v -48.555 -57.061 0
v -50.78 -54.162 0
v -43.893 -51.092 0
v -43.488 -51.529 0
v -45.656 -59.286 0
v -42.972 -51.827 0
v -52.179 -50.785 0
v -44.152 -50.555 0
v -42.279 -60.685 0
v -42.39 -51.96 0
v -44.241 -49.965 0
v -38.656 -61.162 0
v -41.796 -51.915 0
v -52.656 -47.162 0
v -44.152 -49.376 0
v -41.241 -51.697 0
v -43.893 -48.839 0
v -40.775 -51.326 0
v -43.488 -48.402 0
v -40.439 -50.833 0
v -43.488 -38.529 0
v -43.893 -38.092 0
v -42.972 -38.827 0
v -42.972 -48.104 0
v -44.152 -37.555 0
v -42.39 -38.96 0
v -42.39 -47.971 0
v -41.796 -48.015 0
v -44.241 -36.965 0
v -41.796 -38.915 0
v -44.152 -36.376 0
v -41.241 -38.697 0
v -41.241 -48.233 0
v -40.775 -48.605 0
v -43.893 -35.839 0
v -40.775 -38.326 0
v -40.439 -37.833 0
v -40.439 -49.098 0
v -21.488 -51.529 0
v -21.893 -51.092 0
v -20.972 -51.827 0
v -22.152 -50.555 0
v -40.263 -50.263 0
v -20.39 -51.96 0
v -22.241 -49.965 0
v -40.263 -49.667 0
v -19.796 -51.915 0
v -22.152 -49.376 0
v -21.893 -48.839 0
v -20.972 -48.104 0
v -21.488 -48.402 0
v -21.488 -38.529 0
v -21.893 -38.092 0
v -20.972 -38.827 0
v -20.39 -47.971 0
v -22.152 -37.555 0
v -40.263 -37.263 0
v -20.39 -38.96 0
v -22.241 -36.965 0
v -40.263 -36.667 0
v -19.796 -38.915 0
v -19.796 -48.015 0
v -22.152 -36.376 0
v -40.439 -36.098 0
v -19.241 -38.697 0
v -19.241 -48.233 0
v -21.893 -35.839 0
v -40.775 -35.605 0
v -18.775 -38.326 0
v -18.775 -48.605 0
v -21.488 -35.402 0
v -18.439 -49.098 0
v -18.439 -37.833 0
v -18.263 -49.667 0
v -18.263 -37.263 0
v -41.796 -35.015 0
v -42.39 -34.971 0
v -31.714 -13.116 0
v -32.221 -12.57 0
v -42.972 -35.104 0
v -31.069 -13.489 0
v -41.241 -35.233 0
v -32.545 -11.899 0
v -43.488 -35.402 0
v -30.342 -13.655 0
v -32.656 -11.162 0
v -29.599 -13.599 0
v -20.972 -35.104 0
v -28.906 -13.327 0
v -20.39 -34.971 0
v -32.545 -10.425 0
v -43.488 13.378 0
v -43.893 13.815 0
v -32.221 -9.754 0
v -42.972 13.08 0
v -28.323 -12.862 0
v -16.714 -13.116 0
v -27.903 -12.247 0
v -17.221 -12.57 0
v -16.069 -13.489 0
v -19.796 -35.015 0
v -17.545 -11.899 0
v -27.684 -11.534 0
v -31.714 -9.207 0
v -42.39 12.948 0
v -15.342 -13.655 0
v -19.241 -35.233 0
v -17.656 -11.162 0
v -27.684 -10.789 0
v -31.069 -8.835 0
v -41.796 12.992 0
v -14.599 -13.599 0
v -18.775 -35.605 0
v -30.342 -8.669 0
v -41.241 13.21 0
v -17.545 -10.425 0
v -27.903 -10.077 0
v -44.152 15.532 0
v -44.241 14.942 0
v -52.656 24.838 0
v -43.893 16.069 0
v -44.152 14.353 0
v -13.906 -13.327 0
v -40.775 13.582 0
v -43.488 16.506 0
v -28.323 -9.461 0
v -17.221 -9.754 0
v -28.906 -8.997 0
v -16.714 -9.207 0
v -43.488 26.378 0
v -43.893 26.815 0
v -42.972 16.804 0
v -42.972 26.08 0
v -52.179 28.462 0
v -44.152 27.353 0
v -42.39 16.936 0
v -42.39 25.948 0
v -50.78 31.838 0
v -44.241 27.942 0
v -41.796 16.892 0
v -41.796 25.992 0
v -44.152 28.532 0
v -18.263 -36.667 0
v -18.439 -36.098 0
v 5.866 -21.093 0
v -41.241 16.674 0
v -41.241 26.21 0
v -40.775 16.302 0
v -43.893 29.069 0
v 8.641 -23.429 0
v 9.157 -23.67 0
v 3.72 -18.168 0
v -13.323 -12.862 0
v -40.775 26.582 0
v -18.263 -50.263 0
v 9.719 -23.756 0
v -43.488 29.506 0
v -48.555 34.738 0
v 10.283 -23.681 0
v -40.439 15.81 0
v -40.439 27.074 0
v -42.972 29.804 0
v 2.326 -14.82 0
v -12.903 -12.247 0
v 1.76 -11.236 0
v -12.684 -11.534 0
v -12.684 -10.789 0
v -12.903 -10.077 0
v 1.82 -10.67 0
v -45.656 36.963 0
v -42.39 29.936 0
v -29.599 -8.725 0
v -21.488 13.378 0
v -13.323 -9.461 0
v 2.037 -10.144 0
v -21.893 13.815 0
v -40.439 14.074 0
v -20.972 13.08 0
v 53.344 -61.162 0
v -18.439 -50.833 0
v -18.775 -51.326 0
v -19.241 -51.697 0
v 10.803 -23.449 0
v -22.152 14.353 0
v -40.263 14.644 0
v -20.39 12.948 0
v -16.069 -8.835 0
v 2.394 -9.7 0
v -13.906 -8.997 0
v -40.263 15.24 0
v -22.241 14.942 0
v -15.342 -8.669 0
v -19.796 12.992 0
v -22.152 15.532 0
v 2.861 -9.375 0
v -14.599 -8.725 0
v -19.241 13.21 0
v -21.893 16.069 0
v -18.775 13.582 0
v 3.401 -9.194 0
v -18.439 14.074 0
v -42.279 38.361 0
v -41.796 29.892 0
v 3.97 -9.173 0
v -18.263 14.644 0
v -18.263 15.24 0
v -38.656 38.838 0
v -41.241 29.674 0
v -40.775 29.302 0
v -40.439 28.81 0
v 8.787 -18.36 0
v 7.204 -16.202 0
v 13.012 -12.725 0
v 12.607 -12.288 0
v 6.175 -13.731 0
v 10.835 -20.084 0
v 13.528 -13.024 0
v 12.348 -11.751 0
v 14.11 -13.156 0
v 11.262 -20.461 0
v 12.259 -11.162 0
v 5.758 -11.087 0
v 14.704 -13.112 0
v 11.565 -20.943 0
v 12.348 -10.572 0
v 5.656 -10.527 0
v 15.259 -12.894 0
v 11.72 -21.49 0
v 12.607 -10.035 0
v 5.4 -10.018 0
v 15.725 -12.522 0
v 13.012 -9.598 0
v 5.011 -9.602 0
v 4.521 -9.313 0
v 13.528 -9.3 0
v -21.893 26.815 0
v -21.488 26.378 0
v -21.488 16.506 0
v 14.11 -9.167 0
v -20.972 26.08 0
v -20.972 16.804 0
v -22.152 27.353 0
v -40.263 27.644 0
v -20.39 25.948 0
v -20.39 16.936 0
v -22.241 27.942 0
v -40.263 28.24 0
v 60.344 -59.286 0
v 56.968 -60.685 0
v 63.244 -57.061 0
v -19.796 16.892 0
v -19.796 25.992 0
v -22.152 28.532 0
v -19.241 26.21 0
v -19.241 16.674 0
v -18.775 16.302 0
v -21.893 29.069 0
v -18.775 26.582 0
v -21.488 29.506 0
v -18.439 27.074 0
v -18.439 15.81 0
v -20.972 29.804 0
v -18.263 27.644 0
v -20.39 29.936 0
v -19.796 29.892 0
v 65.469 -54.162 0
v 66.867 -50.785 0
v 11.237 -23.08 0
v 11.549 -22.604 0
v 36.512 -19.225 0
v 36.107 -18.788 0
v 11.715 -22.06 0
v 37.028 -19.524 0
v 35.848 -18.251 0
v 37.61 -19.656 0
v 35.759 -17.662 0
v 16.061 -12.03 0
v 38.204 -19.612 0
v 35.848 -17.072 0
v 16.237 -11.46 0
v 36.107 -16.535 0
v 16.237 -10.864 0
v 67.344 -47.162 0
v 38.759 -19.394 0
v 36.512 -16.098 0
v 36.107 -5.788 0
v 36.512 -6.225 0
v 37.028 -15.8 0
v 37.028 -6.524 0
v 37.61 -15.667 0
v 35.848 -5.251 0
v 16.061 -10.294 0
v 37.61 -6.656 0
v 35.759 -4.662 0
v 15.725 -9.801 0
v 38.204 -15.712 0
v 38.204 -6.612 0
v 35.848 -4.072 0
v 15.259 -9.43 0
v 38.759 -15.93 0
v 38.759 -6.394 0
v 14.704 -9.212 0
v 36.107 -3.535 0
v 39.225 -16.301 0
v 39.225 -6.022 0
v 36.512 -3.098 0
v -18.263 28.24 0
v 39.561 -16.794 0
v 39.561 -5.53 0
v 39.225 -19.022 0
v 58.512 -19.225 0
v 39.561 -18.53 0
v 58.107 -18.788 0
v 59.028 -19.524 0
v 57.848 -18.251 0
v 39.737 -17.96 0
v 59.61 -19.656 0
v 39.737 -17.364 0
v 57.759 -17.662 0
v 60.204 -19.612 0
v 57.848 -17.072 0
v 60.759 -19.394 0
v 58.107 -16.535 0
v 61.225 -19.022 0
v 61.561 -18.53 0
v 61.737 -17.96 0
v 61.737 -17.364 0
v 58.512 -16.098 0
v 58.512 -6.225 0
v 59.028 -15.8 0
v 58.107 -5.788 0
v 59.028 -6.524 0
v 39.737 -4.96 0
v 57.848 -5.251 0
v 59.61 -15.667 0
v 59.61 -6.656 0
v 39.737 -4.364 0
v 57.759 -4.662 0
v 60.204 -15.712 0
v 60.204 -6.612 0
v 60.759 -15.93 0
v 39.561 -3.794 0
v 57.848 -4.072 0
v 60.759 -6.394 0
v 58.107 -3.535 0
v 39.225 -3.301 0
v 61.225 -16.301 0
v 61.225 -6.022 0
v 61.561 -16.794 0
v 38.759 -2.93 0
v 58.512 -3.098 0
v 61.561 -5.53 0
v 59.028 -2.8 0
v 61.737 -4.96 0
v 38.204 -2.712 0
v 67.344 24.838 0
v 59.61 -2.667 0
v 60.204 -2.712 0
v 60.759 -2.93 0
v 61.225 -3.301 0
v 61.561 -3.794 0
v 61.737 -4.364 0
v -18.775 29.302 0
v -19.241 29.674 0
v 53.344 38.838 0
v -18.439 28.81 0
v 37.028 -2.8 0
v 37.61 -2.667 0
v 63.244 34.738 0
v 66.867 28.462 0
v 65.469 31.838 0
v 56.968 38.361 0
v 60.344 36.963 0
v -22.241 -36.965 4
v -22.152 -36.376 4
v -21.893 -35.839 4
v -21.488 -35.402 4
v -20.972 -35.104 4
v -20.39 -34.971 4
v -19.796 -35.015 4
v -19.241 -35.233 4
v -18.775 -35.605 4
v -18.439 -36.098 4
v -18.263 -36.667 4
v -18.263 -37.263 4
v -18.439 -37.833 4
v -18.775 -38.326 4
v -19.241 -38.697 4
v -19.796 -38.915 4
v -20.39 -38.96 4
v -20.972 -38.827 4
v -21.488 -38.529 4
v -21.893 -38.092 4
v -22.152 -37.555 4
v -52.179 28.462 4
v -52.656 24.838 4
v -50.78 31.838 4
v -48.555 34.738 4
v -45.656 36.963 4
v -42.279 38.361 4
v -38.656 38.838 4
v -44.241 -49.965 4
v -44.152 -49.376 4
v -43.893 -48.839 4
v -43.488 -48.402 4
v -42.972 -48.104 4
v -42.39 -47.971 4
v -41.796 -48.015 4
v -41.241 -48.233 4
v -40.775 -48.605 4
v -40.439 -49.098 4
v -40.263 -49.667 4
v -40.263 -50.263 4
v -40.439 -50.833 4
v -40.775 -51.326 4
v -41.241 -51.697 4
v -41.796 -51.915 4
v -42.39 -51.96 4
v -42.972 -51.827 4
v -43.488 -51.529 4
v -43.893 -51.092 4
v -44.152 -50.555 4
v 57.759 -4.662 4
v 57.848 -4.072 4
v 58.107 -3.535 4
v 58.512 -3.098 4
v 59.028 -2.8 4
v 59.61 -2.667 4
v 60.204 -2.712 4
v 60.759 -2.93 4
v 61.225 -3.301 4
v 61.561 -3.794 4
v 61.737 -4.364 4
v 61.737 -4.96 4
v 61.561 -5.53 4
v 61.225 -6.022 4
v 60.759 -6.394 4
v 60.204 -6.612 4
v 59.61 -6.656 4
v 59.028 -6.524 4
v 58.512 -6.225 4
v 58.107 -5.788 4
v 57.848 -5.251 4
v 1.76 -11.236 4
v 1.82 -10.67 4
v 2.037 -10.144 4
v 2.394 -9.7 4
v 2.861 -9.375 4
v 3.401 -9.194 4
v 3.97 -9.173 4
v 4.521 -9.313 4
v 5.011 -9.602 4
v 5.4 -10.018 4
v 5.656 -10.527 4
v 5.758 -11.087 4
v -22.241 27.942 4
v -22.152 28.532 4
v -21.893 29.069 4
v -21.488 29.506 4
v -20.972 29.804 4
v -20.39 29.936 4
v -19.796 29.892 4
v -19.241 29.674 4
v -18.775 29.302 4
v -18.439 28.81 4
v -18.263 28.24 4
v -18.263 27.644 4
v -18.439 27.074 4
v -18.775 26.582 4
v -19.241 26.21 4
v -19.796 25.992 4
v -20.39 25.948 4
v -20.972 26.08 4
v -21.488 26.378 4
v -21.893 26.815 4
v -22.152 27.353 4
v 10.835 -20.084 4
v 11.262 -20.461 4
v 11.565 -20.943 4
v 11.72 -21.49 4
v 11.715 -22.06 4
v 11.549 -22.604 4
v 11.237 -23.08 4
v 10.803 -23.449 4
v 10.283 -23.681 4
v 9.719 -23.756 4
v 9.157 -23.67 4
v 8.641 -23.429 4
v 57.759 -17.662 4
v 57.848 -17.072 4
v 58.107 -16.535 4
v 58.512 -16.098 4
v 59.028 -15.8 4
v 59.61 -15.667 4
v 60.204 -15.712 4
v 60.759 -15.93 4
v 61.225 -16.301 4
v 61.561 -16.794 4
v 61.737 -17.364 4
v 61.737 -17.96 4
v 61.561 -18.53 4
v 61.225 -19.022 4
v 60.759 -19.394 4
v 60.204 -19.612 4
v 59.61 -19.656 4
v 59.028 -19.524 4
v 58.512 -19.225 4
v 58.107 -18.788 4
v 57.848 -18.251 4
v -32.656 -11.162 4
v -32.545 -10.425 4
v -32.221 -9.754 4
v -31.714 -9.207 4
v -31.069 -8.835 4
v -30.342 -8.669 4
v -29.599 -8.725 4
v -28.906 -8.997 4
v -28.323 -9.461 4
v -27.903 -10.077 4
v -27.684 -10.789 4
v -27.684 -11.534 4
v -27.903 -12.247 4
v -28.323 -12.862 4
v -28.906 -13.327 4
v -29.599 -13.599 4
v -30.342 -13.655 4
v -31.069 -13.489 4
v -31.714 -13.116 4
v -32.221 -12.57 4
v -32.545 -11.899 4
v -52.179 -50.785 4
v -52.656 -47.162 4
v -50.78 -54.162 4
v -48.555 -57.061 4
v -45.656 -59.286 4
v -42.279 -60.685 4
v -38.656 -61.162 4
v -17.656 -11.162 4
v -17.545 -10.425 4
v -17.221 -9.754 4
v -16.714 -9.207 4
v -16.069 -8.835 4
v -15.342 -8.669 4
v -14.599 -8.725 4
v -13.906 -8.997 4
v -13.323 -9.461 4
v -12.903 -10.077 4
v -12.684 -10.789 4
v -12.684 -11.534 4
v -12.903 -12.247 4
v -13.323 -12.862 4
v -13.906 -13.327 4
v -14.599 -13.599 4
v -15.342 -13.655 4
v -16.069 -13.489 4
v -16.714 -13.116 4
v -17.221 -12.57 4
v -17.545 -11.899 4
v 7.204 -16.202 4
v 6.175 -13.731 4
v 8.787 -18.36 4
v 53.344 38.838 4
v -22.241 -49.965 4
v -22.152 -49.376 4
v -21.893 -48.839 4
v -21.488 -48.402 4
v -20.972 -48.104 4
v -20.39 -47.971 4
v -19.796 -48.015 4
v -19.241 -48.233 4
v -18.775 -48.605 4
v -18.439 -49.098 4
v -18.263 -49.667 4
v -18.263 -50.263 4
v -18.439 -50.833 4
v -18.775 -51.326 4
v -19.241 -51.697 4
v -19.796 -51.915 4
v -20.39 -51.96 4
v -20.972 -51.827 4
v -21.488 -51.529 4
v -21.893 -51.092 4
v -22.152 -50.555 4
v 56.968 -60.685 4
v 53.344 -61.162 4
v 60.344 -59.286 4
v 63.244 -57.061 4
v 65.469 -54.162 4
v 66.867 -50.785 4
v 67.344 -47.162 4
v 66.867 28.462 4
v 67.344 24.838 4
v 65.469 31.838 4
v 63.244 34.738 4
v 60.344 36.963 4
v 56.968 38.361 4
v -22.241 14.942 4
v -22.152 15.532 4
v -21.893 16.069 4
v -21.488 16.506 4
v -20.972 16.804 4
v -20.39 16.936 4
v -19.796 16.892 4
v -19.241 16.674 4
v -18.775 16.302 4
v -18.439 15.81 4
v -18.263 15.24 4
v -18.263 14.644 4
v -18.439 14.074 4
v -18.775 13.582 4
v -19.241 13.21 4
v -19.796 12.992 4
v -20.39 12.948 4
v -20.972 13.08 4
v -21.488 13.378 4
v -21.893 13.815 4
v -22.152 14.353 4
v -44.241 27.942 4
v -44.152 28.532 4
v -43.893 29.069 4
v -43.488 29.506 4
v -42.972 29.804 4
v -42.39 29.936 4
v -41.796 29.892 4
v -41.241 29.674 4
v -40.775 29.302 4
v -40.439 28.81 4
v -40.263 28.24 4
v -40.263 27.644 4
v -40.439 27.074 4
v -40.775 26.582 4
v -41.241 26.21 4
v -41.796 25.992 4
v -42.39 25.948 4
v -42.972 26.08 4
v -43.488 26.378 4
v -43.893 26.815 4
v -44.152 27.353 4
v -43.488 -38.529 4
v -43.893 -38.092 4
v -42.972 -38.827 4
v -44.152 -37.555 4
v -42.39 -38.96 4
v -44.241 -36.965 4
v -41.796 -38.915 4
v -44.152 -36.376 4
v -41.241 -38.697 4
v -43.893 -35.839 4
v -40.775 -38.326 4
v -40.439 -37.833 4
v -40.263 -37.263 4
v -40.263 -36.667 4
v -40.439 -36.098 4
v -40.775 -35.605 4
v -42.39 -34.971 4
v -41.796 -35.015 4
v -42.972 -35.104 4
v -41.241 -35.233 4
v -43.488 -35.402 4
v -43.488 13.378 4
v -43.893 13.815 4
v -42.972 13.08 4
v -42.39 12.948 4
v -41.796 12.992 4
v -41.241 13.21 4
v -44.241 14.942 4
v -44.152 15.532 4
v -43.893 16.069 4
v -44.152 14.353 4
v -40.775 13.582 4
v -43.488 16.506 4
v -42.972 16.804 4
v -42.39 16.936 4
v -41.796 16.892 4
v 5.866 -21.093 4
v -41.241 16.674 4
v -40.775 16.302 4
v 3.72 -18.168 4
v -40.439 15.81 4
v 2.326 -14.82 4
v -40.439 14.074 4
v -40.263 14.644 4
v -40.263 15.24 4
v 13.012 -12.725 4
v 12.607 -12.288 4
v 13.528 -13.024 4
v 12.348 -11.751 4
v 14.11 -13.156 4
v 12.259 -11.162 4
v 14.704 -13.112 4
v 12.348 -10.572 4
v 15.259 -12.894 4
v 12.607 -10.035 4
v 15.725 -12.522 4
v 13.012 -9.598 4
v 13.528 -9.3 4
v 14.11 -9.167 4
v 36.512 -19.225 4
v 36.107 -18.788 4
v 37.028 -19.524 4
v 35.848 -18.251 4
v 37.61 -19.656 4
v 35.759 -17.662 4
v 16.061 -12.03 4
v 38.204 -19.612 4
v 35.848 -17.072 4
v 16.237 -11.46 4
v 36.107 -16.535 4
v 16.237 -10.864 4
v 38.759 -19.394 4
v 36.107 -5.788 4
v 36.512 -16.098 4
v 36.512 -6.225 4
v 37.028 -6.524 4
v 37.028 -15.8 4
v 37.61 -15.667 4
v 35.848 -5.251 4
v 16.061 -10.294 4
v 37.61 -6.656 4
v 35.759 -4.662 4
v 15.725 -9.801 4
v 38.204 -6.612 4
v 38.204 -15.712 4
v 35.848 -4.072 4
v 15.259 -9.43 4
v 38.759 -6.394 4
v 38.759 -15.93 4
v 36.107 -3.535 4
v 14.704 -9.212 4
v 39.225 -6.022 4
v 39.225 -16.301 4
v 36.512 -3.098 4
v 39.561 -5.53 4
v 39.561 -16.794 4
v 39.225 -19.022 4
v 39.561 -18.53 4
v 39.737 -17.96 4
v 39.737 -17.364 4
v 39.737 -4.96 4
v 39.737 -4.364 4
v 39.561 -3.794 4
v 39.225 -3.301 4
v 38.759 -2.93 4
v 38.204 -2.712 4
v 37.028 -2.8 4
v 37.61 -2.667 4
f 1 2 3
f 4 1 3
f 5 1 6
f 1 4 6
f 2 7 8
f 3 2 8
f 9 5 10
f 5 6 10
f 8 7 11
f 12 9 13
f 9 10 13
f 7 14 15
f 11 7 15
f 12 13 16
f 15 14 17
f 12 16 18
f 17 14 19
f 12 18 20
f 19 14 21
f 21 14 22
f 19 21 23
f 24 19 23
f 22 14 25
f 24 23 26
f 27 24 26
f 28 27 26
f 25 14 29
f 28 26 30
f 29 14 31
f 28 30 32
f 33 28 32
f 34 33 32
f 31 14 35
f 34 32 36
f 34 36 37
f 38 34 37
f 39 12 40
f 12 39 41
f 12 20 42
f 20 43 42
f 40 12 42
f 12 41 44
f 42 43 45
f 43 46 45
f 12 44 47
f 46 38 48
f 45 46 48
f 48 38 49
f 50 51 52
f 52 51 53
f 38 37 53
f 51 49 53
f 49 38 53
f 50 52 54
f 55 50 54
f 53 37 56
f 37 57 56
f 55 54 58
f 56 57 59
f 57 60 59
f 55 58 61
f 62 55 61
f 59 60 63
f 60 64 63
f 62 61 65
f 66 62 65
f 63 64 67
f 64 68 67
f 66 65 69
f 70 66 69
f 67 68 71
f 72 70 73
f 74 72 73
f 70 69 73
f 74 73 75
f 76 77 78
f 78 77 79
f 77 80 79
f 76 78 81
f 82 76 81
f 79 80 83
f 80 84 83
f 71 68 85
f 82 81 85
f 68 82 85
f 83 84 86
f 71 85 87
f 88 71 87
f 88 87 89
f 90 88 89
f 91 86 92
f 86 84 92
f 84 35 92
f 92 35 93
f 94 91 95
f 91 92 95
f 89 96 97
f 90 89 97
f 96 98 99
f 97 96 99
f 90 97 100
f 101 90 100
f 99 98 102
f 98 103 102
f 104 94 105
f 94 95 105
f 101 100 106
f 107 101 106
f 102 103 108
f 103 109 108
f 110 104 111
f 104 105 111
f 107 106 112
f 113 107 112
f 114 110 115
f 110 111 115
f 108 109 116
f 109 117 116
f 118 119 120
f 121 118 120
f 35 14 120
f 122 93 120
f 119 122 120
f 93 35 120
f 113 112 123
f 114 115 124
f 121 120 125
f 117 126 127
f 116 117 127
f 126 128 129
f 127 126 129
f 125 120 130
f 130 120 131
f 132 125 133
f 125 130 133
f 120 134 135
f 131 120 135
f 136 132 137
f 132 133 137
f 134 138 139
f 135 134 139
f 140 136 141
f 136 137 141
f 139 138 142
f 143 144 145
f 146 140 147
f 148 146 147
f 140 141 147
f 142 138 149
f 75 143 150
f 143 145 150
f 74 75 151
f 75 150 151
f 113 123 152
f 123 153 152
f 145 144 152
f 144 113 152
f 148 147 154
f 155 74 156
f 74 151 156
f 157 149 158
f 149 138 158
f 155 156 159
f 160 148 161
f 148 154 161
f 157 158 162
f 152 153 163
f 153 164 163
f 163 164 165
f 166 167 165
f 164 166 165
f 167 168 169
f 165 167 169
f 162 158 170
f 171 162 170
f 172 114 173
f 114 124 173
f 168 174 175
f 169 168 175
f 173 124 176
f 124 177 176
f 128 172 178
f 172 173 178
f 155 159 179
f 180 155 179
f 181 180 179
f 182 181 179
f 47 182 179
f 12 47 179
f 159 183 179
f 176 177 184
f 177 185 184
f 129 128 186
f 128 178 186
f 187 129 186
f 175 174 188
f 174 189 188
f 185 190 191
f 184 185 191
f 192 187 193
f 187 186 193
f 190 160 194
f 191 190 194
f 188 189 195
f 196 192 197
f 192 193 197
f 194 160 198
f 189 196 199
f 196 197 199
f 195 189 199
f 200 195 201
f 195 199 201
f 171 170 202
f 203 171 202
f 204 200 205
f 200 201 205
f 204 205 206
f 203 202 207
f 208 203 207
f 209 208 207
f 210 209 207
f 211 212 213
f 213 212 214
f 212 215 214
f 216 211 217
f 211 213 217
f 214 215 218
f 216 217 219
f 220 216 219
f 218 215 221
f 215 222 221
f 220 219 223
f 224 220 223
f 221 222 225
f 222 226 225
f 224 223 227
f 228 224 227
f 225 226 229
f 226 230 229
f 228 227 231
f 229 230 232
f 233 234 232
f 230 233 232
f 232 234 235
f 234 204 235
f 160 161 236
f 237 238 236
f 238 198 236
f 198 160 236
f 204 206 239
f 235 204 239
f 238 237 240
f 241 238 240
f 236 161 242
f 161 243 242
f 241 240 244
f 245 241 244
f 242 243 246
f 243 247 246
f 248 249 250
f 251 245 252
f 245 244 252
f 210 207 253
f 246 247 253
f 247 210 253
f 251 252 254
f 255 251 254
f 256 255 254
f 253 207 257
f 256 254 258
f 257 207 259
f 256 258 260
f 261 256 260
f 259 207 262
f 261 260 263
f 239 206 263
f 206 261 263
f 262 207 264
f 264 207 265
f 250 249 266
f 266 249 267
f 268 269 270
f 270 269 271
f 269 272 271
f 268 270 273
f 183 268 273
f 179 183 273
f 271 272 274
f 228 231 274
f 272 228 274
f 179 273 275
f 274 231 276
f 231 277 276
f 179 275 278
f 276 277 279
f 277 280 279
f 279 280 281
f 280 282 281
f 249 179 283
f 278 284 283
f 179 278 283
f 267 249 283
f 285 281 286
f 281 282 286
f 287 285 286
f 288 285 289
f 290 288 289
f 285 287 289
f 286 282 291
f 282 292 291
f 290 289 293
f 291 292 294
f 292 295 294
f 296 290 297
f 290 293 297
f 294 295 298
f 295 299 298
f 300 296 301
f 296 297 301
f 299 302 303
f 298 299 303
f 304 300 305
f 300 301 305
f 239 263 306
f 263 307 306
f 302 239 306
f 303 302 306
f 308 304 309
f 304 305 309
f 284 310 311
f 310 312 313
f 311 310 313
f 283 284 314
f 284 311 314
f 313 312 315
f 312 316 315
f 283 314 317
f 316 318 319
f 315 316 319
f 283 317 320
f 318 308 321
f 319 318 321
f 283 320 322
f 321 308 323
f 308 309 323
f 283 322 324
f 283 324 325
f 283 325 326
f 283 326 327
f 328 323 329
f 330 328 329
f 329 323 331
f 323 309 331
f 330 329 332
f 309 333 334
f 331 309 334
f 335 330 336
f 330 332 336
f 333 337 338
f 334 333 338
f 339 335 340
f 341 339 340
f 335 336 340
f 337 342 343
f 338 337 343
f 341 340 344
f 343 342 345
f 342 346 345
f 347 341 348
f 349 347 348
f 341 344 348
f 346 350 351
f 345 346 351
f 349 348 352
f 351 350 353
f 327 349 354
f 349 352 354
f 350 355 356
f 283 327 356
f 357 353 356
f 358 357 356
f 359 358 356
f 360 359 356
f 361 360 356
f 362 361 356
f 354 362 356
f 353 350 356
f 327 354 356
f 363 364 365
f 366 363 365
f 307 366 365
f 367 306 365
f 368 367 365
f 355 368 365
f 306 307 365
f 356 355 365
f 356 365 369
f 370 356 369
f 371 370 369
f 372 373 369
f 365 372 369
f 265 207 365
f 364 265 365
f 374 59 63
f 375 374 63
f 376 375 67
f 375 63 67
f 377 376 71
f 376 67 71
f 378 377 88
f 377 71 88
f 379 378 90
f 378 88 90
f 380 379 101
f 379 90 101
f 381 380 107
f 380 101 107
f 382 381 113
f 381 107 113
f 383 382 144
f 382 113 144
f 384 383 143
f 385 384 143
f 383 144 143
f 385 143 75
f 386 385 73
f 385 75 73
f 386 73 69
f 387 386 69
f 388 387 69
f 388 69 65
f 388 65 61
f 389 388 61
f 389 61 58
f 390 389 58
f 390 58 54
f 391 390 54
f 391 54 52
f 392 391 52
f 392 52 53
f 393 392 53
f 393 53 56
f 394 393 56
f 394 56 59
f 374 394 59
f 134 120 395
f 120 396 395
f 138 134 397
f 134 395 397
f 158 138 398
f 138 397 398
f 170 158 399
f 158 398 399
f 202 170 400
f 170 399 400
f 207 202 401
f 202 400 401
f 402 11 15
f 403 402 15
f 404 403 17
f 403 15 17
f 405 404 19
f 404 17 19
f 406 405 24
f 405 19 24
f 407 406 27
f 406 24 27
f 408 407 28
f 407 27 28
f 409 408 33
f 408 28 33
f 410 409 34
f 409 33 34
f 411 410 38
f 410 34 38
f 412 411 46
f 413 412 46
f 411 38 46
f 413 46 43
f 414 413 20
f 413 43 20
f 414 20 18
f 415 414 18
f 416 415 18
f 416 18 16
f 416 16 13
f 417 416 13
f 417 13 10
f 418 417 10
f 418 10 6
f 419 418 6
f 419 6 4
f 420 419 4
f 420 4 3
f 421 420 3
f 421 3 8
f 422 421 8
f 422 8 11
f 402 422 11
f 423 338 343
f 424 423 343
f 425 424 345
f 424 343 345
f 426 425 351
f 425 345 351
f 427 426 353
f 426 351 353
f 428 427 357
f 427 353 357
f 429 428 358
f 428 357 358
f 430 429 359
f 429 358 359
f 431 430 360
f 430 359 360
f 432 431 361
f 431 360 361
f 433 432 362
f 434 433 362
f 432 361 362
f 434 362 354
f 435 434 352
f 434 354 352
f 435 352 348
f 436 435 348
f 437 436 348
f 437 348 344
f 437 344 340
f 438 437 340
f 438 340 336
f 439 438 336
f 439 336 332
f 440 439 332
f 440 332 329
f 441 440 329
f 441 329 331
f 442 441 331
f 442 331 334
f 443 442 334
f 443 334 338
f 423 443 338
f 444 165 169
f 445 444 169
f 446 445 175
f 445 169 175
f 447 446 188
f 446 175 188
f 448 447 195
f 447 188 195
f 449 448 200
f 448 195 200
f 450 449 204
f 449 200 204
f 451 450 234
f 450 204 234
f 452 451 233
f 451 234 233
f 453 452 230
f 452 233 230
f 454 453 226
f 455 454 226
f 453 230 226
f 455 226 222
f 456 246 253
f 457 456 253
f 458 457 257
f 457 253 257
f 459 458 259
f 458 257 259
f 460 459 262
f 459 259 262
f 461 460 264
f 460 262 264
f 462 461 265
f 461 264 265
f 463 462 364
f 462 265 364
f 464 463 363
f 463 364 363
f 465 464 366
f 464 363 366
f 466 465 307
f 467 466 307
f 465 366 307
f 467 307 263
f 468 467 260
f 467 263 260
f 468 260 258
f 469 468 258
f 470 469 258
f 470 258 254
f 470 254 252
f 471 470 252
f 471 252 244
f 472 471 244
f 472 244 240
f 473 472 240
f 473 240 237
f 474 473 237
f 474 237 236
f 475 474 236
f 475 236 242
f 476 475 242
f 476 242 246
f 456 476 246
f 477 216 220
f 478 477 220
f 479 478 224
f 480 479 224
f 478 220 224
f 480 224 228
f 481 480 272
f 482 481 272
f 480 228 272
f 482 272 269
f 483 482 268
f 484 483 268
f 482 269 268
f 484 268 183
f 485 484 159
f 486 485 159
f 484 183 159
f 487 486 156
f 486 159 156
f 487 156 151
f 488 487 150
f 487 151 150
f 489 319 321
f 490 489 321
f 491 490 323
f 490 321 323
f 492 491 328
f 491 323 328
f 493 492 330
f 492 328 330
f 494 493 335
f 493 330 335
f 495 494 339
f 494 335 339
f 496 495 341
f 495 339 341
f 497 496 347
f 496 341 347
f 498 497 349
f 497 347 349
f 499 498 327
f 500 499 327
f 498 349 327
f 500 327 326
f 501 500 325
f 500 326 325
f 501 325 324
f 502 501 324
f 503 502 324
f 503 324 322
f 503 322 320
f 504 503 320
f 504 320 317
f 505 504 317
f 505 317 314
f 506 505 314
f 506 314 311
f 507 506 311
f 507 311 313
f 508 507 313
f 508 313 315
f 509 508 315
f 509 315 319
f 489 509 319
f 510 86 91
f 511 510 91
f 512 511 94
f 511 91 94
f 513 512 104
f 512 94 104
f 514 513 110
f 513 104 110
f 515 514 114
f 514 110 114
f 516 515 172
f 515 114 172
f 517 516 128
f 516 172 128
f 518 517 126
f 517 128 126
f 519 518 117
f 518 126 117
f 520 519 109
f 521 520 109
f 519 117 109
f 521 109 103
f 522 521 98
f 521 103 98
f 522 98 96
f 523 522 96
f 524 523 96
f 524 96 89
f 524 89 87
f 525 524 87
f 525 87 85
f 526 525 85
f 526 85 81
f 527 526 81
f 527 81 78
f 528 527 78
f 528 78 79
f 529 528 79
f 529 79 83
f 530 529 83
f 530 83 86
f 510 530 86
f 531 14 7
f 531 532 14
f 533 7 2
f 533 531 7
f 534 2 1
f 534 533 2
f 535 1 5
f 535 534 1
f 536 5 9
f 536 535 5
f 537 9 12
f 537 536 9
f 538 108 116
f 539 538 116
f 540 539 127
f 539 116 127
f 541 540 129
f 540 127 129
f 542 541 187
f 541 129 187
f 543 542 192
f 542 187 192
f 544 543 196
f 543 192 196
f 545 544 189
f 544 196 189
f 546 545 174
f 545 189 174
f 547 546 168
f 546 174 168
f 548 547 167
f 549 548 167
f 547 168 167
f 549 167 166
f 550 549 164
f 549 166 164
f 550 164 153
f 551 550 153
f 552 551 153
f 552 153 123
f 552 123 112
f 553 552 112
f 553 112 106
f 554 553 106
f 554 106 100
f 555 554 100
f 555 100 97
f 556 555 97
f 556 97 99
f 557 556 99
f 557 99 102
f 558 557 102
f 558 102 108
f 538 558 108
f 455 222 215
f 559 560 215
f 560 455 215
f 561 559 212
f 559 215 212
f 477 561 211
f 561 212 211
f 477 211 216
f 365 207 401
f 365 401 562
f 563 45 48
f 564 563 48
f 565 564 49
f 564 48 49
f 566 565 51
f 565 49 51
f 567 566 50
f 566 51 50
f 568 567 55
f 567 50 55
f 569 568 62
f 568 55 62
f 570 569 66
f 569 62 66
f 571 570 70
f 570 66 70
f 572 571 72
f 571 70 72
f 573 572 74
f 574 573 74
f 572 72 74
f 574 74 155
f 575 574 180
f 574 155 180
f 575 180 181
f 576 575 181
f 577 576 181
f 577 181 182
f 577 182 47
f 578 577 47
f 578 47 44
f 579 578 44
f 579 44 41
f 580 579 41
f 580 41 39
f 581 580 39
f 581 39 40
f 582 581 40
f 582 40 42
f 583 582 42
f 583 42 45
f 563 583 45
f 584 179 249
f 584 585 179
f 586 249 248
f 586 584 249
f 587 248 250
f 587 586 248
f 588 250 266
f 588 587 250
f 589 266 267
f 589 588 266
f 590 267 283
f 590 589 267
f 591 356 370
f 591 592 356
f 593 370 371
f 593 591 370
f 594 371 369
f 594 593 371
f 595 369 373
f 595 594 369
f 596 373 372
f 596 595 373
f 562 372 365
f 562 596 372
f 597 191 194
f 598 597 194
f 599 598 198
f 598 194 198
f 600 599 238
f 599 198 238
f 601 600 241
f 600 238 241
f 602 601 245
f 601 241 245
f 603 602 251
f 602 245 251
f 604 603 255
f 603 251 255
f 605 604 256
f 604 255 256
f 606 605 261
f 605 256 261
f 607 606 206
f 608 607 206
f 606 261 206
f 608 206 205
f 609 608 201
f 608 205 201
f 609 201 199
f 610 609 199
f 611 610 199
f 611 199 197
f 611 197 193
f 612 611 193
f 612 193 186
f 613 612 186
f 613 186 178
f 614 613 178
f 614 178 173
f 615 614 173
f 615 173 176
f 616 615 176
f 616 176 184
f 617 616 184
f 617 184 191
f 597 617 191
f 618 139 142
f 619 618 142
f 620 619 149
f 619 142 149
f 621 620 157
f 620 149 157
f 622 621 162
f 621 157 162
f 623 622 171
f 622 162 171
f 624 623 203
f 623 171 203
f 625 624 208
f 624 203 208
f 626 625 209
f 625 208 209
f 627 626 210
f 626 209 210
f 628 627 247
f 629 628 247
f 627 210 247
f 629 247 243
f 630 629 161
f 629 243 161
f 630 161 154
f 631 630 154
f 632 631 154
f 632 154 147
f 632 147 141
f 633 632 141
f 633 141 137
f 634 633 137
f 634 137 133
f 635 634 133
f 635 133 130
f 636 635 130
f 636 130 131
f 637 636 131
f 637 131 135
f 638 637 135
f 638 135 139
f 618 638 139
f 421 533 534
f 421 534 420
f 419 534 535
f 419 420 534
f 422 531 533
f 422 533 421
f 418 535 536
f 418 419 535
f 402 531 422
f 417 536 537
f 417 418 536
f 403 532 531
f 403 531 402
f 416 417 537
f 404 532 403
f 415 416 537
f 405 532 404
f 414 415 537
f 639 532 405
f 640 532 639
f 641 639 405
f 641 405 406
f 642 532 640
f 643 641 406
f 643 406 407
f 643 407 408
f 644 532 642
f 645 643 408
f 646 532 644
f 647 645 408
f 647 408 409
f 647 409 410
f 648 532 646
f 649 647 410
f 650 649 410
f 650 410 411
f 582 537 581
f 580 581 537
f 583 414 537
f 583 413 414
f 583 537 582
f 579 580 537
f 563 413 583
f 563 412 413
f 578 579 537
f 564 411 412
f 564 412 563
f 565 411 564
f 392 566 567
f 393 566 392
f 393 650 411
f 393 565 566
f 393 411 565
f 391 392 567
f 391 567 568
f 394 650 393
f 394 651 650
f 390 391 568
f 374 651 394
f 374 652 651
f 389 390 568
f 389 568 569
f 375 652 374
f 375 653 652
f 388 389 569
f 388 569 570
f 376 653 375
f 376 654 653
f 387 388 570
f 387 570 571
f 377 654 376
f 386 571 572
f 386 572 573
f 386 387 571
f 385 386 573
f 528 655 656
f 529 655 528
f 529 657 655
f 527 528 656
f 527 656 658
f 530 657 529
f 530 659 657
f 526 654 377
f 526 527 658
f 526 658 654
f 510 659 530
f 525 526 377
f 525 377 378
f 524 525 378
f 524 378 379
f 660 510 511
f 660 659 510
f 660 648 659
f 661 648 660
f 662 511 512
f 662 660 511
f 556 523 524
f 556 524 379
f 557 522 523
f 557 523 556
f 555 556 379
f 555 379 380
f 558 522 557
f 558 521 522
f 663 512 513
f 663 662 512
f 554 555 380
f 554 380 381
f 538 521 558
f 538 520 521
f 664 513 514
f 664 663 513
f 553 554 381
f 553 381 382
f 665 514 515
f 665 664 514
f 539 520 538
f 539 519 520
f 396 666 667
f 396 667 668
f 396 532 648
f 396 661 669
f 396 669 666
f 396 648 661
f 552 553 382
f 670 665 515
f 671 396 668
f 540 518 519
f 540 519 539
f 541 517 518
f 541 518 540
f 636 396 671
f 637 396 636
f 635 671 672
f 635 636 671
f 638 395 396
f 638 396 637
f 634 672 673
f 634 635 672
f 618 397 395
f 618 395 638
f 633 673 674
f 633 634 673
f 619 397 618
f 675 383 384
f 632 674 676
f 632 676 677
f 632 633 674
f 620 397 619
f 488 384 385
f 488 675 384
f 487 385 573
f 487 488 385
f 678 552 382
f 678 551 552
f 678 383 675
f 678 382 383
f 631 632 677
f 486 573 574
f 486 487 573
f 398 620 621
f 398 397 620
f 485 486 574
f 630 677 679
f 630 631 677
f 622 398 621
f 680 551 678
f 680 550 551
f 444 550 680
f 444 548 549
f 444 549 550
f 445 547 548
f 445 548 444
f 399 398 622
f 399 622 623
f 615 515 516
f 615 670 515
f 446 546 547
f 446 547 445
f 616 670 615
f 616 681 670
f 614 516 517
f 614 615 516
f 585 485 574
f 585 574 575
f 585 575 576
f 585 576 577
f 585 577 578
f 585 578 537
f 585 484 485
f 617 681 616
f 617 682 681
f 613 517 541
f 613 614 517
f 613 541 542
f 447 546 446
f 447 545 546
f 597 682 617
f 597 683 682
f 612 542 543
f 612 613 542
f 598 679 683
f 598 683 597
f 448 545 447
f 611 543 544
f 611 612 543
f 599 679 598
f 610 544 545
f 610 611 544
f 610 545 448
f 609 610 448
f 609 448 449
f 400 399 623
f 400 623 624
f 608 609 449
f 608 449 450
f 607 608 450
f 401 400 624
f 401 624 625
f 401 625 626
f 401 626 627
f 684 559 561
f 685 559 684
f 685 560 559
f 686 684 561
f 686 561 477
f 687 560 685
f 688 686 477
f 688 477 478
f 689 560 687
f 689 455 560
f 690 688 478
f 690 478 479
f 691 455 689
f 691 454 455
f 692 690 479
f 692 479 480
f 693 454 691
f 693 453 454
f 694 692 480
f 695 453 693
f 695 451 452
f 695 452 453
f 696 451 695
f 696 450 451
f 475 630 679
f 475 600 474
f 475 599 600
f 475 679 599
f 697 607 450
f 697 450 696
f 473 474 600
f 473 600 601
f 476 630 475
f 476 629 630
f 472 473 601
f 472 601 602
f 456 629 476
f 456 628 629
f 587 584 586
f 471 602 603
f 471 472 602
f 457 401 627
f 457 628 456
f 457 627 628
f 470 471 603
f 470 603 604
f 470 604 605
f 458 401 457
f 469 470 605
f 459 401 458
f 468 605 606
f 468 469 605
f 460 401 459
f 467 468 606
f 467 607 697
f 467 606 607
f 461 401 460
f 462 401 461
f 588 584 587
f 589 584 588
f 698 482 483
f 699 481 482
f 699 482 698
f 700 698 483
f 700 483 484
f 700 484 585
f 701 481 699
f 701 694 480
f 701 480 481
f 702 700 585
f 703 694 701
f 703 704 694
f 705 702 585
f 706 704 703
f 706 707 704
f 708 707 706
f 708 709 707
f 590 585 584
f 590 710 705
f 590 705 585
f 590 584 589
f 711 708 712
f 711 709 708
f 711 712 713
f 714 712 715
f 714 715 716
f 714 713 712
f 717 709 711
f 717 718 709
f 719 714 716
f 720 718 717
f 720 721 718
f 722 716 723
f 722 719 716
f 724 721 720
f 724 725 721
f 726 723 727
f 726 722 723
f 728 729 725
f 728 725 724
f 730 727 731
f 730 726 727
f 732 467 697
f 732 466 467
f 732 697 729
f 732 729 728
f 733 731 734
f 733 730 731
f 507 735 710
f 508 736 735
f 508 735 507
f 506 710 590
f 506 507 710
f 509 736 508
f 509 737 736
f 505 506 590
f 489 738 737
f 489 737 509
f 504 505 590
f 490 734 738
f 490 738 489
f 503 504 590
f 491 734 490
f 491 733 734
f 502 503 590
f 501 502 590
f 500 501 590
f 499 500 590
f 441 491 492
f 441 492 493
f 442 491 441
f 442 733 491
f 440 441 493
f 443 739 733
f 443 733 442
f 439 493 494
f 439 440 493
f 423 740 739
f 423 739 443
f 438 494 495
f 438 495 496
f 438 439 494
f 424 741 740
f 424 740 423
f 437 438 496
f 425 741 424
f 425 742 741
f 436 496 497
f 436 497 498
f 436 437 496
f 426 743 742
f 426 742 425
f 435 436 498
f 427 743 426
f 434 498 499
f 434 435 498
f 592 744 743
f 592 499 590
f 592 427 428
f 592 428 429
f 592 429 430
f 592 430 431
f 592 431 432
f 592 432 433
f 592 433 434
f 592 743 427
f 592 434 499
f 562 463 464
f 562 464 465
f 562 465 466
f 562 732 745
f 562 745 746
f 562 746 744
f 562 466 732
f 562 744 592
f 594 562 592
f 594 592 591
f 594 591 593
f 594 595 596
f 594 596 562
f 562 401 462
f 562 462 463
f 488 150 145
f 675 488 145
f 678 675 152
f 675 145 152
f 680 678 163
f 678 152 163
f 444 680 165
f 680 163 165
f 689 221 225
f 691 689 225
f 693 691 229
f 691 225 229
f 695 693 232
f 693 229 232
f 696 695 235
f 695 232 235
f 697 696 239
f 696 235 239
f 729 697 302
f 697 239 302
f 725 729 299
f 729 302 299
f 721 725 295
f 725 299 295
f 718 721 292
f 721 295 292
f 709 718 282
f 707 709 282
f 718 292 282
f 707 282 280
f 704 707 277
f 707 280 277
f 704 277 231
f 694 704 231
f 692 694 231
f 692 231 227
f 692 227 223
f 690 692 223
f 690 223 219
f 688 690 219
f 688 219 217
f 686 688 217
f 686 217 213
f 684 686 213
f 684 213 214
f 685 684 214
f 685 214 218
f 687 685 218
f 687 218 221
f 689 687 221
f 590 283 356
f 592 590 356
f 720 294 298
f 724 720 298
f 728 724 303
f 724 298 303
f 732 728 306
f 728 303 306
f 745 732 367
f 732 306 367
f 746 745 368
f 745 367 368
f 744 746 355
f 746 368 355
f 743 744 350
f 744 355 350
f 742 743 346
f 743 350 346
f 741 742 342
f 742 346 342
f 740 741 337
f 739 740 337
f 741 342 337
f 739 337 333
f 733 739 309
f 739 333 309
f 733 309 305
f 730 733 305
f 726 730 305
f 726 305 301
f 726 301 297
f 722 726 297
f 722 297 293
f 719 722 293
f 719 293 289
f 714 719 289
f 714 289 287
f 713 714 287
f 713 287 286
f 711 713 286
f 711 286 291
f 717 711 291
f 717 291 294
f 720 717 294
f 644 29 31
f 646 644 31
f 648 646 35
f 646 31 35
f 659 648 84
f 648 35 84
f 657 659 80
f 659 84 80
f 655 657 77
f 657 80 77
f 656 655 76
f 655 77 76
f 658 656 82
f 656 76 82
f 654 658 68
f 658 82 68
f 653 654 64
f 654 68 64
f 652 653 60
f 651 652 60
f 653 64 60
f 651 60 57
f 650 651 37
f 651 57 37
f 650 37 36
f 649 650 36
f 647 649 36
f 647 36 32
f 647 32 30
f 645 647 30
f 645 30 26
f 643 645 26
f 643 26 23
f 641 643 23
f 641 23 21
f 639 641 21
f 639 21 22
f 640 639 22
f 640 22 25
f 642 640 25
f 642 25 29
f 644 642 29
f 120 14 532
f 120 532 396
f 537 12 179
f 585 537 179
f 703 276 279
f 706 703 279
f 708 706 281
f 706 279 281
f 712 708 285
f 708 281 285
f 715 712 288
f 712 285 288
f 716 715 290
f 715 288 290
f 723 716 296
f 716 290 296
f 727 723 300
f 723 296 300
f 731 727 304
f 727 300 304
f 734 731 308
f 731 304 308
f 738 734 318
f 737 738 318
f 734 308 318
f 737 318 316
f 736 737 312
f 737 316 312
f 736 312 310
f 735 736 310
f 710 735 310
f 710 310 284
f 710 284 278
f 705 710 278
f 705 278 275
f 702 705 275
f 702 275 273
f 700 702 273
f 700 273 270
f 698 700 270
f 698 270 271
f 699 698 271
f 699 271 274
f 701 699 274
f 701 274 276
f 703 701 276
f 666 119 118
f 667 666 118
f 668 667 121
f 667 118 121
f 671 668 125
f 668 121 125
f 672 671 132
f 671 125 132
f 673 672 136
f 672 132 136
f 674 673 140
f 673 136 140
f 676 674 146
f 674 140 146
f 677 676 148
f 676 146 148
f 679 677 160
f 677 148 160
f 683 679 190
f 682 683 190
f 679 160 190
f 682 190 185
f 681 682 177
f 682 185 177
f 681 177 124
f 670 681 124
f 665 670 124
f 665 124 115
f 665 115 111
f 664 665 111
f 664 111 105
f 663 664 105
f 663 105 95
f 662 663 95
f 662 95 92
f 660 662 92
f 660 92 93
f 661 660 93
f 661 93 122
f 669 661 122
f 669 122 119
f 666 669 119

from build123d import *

# Parameters (mm, degrees)
SKETCH_1_W          = 120
SKETCH_1_H          = 100
EXTRUDE_1_DEPTH     = 4
FILLET_1_R          = 14
SKETCH_7_R          = 2.5
CUT_EXTRUDE_2_DEPTH = 5
SKETCH_14_R         = 2
CUT_EXTRUDE_3_DEPTH = 5


with BuildPart() as part:
    # 草图1 → 凸台-拉伸1 (new body)
    with BuildSketch(Plane.XY):
        with Locations((7.34439834, -11.161825726)):
            Rectangle(SKETCH_1_W, SKETCH_1_H)
    extrude(amount=EXTRUDE_1_DEPTH)

    # 圆角1
    fillet_1_edges = [part.edges().sort_by_distance(p)[0] for p in [
        (-52.65560166, 38.838174274, 2),
        (67.34439834, 38.838174274, 2),
        (67.34439834, -61.161825726, 2),
        (-52.65560166, -61.161825726, 2),
    ]]
    fillet(fillet_1_edges, radius=FILLET_1_R)

    # 草图7 → 切除-拉伸2 (cut, through all)
    with BuildSketch(Plane(origin=(0, 0, 0), x_dir=(-1, 0, 0), z_dir=(0, 0, -1))):
        with Locations((15.15560166, -11.161825726)):
            Circle(SKETCH_7_R)
        with Locations((30.15560166, -11.161825726)):
            Circle(SKETCH_7_R)
    extrude(amount=-CUT_EXTRUDE_2_DEPTH, mode=Mode.SUBTRACT)

    # 草图14 → 切除-拉伸3 (cut, through all)
    with BuildSketch(Plane(origin=(0, 0, 0), x_dir=(-1, 0, 0), z_dir=(0, 0, -1))):
        with Locations((42.240931861, -49.965268324)):
            Circle(SKETCH_14_R)
        with Locations((20.240931861, -49.965268324)):
            Circle(SKETCH_14_R)
        with Locations((42.240931861, -36.965268324)):
            Circle(SKETCH_14_R)
        with Locations((20.240931861, -36.965268324)):
            Circle(SKETCH_14_R)
        with Locations((42.240931861, 14.942073)):
            Circle(SKETCH_14_R)
        with Locations((42.240931861, 27.942073)):
            Circle(SKETCH_14_R)
        with Locations((20.240931861, 14.942073)):
            Circle(SKETCH_14_R)
        with Locations((20.240931861, 27.942073)):
            Circle(SKETCH_14_R)
        with Locations((-14.259068139, -11.161825726)):
            Circle(SKETCH_14_R)
        with Locations((-37.759068139, -17.661825726)):
            Circle(SKETCH_14_R)
        with Locations((-59.759068139, -17.661825726)):
            Circle(SKETCH_14_R)
        with Locations((-59.759068139, -4.661825726)):
            Circle(SKETCH_14_R)
        with Locations((-37.759068139, -4.661825726)):
            Circle(SKETCH_14_R)
        with BuildLine():
            ThreePointArc((-1.760462288, -11.236489328), (-3.684404538, -9.163219875), (-5.75767399, -11.087162125))
            ThreePointArc((-5.75767399, -11.087162125), (-7.203940461, -16.202085414), (-10.83494306, -20.084088387))
            ThreePointArc((-10.83494306, -20.084088387), (-11.410230768, -22.85339228), (-8.640926875, -23.428679989))
            ThreePointArc((-8.640926875, -23.428679989), (-3.720371267, -18.167981055), (-1.760462288, -11.236489328))
        make_face()
    extrude(amount=-CUT_EXTRUDE_3_DEPTH, mode=Mode.SUBTRACT)


solid = part.part
